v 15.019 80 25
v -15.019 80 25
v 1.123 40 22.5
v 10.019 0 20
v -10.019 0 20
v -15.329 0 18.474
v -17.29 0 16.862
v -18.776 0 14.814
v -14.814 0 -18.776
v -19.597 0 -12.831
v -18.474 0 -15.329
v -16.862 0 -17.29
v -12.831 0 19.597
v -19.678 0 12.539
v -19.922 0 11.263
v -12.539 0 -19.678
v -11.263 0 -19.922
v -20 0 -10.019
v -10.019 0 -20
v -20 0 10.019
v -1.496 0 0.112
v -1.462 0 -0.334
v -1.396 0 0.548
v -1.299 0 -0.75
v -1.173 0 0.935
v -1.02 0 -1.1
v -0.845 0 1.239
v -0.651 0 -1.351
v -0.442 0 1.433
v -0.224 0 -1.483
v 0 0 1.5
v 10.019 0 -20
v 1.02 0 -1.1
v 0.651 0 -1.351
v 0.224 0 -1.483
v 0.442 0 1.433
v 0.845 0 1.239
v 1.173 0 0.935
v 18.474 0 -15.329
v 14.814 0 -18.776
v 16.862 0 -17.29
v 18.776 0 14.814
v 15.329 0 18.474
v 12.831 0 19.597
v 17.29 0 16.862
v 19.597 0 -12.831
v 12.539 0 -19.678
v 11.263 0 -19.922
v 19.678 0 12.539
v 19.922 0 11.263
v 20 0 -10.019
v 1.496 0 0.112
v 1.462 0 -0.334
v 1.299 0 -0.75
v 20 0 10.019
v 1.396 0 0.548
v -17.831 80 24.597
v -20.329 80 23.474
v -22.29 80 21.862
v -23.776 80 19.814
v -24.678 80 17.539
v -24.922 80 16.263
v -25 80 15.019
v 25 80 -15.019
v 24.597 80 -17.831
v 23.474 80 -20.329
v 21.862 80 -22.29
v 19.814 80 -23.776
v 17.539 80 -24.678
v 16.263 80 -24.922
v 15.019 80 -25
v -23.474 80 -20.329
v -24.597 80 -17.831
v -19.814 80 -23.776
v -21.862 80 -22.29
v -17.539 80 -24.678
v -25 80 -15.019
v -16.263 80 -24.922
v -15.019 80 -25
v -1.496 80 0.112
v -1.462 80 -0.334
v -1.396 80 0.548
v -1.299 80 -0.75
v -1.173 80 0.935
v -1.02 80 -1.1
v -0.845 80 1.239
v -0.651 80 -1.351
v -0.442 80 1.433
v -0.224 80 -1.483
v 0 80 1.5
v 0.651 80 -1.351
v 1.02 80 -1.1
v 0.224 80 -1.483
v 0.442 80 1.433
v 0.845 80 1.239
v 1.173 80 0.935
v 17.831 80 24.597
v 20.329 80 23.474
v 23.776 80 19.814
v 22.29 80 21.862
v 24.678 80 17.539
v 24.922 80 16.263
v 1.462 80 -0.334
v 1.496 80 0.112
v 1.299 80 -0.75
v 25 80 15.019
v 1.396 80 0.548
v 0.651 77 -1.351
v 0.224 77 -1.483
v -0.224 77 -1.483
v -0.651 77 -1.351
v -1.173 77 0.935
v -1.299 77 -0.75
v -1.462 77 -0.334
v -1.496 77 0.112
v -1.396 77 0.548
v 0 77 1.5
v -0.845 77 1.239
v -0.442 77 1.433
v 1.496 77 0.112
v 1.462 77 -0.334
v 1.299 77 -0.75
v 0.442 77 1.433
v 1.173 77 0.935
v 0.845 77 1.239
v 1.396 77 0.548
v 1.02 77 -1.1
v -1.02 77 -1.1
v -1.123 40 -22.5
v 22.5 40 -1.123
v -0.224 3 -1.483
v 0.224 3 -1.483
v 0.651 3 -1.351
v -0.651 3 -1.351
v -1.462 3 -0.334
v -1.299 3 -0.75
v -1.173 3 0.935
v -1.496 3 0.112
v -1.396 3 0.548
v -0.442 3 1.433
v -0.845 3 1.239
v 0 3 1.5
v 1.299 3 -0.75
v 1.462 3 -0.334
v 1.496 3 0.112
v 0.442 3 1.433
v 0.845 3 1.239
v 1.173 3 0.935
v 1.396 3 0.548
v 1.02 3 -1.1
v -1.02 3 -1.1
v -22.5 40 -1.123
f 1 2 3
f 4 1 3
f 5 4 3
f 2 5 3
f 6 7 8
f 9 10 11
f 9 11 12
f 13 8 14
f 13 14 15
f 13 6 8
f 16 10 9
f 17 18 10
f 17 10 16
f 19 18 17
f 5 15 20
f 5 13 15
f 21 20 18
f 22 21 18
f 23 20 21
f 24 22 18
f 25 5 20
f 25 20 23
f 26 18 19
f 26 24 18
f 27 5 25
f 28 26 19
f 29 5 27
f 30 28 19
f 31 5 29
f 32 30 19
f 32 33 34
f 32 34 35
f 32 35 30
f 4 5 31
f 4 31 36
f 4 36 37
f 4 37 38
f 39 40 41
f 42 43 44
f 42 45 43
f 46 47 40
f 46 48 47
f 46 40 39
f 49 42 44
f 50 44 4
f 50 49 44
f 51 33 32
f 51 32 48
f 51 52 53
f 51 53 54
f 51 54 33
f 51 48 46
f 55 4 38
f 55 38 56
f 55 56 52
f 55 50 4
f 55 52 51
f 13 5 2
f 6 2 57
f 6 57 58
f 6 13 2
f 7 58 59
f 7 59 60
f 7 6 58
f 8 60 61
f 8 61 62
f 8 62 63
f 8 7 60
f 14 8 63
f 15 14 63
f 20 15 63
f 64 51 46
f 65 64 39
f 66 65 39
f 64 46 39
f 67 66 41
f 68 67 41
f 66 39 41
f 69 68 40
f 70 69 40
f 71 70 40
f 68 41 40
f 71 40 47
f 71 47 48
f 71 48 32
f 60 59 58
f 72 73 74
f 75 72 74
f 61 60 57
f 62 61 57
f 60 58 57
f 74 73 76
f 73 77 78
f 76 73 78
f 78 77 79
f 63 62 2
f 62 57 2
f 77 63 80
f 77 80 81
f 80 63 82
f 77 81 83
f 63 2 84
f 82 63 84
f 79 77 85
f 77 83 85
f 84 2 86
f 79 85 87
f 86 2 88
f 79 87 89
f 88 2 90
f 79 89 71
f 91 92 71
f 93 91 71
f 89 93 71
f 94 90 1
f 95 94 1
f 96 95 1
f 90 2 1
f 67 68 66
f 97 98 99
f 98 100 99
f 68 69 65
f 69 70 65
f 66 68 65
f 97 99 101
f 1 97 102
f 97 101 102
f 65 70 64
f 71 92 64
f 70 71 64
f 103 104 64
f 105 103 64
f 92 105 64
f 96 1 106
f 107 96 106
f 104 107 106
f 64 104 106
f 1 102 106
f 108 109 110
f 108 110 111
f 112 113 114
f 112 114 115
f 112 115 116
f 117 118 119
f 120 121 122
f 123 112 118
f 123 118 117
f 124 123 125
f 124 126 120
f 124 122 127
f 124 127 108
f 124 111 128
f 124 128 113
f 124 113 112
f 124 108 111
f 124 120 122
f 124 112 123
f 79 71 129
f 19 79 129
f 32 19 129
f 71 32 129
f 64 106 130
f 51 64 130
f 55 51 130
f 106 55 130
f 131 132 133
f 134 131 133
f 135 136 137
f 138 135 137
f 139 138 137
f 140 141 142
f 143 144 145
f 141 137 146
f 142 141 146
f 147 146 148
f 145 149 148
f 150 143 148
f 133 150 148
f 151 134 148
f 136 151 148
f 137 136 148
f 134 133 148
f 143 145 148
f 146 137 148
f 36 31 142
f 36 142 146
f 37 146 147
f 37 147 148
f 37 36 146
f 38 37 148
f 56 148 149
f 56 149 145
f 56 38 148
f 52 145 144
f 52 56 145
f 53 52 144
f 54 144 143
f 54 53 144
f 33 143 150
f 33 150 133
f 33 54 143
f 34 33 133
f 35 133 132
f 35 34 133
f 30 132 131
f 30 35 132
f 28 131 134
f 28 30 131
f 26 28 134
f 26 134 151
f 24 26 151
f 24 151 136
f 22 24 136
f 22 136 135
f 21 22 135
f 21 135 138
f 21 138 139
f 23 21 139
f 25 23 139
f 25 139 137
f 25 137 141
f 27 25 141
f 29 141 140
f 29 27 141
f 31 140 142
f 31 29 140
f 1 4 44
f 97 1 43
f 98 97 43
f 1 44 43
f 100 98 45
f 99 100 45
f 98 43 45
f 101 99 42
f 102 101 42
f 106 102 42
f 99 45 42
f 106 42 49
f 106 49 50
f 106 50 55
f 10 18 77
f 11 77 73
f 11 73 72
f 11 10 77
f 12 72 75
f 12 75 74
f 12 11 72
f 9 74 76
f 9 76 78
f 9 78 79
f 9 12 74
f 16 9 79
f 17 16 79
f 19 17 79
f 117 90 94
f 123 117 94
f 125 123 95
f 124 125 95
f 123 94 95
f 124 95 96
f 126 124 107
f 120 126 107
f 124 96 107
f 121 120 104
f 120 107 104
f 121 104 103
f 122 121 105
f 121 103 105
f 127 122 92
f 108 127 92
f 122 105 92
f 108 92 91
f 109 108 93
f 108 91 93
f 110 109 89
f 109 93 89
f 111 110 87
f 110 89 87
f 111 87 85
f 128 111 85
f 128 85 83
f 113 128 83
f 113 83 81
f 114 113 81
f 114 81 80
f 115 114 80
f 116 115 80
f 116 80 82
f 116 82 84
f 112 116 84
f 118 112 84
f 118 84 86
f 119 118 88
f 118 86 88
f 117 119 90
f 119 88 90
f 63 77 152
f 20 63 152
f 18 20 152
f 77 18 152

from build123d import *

# Parameters (mm, degrees)
SKETCH3_R          = 1.5
CUT_EXTRUDE1_DEPTH = 3
FILLET1_R          = 10


with BuildPart() as part:
    # Sketch2 → Loft1 section 0
    with BuildSketch(Plane(origin=(0, 80, 0), x_dir=(1, 0, 0), z_dir=(0, 1, 0))):
        with BuildLine():
            Line((-25, -25), (25, -25))
            Line((25, -25), (25, 25))
            Line((25, 25), (-25, 25))
            Line((-25, 25), (-25, -25))
        make_face()
    # Sketch1 → Loft1 section 1
    with BuildSketch(Plane(origin=(0, 0, 0), x_dir=(1, 0, 0), z_dir=(0, 1, 0))):
        with BuildLine():
            Line((-20, -20), (20, -20))
            Line((20, -20), (20, 20))
            Line((20, 20), (-20, 20))
            Line((-20, 20), (-20, -20))
        make_face()
    loft()

    # Sketch3 → Cut-Extrude1 (cut)
    with BuildSketch(Plane(origin=(0, 80, 0), x_dir=(1, 0, 0), z_dir=(0, 1, 0))):
        with Locations(Location((0, 0, 0), (0, 0, 270))):
            Circle(SKETCH3_R)
    cut_extrude1 = extrude(amount=-CUT_EXTRUDE1_DEPTH, mode=Mode.SUBTRACT)

    # Mirror1: Cut-Extrude1 across plane
    add(cut_extrude1.mirror(Plane.ZX.offset(40)), mode=Mode.SUBTRACT)

    # Fillet1
    fillet1_edges = [part.edges().sort_by_distance(p)[0] for p in [
        (-22.5, 40, 22.5),
        (-22.5, 40, -22.5),
        (22.5, 40, -22.5),
        (22.5, 40, 22.5),
    ]]
    fillet(fillet1_edges, radius=FILLET1_R)


solid = part.part
